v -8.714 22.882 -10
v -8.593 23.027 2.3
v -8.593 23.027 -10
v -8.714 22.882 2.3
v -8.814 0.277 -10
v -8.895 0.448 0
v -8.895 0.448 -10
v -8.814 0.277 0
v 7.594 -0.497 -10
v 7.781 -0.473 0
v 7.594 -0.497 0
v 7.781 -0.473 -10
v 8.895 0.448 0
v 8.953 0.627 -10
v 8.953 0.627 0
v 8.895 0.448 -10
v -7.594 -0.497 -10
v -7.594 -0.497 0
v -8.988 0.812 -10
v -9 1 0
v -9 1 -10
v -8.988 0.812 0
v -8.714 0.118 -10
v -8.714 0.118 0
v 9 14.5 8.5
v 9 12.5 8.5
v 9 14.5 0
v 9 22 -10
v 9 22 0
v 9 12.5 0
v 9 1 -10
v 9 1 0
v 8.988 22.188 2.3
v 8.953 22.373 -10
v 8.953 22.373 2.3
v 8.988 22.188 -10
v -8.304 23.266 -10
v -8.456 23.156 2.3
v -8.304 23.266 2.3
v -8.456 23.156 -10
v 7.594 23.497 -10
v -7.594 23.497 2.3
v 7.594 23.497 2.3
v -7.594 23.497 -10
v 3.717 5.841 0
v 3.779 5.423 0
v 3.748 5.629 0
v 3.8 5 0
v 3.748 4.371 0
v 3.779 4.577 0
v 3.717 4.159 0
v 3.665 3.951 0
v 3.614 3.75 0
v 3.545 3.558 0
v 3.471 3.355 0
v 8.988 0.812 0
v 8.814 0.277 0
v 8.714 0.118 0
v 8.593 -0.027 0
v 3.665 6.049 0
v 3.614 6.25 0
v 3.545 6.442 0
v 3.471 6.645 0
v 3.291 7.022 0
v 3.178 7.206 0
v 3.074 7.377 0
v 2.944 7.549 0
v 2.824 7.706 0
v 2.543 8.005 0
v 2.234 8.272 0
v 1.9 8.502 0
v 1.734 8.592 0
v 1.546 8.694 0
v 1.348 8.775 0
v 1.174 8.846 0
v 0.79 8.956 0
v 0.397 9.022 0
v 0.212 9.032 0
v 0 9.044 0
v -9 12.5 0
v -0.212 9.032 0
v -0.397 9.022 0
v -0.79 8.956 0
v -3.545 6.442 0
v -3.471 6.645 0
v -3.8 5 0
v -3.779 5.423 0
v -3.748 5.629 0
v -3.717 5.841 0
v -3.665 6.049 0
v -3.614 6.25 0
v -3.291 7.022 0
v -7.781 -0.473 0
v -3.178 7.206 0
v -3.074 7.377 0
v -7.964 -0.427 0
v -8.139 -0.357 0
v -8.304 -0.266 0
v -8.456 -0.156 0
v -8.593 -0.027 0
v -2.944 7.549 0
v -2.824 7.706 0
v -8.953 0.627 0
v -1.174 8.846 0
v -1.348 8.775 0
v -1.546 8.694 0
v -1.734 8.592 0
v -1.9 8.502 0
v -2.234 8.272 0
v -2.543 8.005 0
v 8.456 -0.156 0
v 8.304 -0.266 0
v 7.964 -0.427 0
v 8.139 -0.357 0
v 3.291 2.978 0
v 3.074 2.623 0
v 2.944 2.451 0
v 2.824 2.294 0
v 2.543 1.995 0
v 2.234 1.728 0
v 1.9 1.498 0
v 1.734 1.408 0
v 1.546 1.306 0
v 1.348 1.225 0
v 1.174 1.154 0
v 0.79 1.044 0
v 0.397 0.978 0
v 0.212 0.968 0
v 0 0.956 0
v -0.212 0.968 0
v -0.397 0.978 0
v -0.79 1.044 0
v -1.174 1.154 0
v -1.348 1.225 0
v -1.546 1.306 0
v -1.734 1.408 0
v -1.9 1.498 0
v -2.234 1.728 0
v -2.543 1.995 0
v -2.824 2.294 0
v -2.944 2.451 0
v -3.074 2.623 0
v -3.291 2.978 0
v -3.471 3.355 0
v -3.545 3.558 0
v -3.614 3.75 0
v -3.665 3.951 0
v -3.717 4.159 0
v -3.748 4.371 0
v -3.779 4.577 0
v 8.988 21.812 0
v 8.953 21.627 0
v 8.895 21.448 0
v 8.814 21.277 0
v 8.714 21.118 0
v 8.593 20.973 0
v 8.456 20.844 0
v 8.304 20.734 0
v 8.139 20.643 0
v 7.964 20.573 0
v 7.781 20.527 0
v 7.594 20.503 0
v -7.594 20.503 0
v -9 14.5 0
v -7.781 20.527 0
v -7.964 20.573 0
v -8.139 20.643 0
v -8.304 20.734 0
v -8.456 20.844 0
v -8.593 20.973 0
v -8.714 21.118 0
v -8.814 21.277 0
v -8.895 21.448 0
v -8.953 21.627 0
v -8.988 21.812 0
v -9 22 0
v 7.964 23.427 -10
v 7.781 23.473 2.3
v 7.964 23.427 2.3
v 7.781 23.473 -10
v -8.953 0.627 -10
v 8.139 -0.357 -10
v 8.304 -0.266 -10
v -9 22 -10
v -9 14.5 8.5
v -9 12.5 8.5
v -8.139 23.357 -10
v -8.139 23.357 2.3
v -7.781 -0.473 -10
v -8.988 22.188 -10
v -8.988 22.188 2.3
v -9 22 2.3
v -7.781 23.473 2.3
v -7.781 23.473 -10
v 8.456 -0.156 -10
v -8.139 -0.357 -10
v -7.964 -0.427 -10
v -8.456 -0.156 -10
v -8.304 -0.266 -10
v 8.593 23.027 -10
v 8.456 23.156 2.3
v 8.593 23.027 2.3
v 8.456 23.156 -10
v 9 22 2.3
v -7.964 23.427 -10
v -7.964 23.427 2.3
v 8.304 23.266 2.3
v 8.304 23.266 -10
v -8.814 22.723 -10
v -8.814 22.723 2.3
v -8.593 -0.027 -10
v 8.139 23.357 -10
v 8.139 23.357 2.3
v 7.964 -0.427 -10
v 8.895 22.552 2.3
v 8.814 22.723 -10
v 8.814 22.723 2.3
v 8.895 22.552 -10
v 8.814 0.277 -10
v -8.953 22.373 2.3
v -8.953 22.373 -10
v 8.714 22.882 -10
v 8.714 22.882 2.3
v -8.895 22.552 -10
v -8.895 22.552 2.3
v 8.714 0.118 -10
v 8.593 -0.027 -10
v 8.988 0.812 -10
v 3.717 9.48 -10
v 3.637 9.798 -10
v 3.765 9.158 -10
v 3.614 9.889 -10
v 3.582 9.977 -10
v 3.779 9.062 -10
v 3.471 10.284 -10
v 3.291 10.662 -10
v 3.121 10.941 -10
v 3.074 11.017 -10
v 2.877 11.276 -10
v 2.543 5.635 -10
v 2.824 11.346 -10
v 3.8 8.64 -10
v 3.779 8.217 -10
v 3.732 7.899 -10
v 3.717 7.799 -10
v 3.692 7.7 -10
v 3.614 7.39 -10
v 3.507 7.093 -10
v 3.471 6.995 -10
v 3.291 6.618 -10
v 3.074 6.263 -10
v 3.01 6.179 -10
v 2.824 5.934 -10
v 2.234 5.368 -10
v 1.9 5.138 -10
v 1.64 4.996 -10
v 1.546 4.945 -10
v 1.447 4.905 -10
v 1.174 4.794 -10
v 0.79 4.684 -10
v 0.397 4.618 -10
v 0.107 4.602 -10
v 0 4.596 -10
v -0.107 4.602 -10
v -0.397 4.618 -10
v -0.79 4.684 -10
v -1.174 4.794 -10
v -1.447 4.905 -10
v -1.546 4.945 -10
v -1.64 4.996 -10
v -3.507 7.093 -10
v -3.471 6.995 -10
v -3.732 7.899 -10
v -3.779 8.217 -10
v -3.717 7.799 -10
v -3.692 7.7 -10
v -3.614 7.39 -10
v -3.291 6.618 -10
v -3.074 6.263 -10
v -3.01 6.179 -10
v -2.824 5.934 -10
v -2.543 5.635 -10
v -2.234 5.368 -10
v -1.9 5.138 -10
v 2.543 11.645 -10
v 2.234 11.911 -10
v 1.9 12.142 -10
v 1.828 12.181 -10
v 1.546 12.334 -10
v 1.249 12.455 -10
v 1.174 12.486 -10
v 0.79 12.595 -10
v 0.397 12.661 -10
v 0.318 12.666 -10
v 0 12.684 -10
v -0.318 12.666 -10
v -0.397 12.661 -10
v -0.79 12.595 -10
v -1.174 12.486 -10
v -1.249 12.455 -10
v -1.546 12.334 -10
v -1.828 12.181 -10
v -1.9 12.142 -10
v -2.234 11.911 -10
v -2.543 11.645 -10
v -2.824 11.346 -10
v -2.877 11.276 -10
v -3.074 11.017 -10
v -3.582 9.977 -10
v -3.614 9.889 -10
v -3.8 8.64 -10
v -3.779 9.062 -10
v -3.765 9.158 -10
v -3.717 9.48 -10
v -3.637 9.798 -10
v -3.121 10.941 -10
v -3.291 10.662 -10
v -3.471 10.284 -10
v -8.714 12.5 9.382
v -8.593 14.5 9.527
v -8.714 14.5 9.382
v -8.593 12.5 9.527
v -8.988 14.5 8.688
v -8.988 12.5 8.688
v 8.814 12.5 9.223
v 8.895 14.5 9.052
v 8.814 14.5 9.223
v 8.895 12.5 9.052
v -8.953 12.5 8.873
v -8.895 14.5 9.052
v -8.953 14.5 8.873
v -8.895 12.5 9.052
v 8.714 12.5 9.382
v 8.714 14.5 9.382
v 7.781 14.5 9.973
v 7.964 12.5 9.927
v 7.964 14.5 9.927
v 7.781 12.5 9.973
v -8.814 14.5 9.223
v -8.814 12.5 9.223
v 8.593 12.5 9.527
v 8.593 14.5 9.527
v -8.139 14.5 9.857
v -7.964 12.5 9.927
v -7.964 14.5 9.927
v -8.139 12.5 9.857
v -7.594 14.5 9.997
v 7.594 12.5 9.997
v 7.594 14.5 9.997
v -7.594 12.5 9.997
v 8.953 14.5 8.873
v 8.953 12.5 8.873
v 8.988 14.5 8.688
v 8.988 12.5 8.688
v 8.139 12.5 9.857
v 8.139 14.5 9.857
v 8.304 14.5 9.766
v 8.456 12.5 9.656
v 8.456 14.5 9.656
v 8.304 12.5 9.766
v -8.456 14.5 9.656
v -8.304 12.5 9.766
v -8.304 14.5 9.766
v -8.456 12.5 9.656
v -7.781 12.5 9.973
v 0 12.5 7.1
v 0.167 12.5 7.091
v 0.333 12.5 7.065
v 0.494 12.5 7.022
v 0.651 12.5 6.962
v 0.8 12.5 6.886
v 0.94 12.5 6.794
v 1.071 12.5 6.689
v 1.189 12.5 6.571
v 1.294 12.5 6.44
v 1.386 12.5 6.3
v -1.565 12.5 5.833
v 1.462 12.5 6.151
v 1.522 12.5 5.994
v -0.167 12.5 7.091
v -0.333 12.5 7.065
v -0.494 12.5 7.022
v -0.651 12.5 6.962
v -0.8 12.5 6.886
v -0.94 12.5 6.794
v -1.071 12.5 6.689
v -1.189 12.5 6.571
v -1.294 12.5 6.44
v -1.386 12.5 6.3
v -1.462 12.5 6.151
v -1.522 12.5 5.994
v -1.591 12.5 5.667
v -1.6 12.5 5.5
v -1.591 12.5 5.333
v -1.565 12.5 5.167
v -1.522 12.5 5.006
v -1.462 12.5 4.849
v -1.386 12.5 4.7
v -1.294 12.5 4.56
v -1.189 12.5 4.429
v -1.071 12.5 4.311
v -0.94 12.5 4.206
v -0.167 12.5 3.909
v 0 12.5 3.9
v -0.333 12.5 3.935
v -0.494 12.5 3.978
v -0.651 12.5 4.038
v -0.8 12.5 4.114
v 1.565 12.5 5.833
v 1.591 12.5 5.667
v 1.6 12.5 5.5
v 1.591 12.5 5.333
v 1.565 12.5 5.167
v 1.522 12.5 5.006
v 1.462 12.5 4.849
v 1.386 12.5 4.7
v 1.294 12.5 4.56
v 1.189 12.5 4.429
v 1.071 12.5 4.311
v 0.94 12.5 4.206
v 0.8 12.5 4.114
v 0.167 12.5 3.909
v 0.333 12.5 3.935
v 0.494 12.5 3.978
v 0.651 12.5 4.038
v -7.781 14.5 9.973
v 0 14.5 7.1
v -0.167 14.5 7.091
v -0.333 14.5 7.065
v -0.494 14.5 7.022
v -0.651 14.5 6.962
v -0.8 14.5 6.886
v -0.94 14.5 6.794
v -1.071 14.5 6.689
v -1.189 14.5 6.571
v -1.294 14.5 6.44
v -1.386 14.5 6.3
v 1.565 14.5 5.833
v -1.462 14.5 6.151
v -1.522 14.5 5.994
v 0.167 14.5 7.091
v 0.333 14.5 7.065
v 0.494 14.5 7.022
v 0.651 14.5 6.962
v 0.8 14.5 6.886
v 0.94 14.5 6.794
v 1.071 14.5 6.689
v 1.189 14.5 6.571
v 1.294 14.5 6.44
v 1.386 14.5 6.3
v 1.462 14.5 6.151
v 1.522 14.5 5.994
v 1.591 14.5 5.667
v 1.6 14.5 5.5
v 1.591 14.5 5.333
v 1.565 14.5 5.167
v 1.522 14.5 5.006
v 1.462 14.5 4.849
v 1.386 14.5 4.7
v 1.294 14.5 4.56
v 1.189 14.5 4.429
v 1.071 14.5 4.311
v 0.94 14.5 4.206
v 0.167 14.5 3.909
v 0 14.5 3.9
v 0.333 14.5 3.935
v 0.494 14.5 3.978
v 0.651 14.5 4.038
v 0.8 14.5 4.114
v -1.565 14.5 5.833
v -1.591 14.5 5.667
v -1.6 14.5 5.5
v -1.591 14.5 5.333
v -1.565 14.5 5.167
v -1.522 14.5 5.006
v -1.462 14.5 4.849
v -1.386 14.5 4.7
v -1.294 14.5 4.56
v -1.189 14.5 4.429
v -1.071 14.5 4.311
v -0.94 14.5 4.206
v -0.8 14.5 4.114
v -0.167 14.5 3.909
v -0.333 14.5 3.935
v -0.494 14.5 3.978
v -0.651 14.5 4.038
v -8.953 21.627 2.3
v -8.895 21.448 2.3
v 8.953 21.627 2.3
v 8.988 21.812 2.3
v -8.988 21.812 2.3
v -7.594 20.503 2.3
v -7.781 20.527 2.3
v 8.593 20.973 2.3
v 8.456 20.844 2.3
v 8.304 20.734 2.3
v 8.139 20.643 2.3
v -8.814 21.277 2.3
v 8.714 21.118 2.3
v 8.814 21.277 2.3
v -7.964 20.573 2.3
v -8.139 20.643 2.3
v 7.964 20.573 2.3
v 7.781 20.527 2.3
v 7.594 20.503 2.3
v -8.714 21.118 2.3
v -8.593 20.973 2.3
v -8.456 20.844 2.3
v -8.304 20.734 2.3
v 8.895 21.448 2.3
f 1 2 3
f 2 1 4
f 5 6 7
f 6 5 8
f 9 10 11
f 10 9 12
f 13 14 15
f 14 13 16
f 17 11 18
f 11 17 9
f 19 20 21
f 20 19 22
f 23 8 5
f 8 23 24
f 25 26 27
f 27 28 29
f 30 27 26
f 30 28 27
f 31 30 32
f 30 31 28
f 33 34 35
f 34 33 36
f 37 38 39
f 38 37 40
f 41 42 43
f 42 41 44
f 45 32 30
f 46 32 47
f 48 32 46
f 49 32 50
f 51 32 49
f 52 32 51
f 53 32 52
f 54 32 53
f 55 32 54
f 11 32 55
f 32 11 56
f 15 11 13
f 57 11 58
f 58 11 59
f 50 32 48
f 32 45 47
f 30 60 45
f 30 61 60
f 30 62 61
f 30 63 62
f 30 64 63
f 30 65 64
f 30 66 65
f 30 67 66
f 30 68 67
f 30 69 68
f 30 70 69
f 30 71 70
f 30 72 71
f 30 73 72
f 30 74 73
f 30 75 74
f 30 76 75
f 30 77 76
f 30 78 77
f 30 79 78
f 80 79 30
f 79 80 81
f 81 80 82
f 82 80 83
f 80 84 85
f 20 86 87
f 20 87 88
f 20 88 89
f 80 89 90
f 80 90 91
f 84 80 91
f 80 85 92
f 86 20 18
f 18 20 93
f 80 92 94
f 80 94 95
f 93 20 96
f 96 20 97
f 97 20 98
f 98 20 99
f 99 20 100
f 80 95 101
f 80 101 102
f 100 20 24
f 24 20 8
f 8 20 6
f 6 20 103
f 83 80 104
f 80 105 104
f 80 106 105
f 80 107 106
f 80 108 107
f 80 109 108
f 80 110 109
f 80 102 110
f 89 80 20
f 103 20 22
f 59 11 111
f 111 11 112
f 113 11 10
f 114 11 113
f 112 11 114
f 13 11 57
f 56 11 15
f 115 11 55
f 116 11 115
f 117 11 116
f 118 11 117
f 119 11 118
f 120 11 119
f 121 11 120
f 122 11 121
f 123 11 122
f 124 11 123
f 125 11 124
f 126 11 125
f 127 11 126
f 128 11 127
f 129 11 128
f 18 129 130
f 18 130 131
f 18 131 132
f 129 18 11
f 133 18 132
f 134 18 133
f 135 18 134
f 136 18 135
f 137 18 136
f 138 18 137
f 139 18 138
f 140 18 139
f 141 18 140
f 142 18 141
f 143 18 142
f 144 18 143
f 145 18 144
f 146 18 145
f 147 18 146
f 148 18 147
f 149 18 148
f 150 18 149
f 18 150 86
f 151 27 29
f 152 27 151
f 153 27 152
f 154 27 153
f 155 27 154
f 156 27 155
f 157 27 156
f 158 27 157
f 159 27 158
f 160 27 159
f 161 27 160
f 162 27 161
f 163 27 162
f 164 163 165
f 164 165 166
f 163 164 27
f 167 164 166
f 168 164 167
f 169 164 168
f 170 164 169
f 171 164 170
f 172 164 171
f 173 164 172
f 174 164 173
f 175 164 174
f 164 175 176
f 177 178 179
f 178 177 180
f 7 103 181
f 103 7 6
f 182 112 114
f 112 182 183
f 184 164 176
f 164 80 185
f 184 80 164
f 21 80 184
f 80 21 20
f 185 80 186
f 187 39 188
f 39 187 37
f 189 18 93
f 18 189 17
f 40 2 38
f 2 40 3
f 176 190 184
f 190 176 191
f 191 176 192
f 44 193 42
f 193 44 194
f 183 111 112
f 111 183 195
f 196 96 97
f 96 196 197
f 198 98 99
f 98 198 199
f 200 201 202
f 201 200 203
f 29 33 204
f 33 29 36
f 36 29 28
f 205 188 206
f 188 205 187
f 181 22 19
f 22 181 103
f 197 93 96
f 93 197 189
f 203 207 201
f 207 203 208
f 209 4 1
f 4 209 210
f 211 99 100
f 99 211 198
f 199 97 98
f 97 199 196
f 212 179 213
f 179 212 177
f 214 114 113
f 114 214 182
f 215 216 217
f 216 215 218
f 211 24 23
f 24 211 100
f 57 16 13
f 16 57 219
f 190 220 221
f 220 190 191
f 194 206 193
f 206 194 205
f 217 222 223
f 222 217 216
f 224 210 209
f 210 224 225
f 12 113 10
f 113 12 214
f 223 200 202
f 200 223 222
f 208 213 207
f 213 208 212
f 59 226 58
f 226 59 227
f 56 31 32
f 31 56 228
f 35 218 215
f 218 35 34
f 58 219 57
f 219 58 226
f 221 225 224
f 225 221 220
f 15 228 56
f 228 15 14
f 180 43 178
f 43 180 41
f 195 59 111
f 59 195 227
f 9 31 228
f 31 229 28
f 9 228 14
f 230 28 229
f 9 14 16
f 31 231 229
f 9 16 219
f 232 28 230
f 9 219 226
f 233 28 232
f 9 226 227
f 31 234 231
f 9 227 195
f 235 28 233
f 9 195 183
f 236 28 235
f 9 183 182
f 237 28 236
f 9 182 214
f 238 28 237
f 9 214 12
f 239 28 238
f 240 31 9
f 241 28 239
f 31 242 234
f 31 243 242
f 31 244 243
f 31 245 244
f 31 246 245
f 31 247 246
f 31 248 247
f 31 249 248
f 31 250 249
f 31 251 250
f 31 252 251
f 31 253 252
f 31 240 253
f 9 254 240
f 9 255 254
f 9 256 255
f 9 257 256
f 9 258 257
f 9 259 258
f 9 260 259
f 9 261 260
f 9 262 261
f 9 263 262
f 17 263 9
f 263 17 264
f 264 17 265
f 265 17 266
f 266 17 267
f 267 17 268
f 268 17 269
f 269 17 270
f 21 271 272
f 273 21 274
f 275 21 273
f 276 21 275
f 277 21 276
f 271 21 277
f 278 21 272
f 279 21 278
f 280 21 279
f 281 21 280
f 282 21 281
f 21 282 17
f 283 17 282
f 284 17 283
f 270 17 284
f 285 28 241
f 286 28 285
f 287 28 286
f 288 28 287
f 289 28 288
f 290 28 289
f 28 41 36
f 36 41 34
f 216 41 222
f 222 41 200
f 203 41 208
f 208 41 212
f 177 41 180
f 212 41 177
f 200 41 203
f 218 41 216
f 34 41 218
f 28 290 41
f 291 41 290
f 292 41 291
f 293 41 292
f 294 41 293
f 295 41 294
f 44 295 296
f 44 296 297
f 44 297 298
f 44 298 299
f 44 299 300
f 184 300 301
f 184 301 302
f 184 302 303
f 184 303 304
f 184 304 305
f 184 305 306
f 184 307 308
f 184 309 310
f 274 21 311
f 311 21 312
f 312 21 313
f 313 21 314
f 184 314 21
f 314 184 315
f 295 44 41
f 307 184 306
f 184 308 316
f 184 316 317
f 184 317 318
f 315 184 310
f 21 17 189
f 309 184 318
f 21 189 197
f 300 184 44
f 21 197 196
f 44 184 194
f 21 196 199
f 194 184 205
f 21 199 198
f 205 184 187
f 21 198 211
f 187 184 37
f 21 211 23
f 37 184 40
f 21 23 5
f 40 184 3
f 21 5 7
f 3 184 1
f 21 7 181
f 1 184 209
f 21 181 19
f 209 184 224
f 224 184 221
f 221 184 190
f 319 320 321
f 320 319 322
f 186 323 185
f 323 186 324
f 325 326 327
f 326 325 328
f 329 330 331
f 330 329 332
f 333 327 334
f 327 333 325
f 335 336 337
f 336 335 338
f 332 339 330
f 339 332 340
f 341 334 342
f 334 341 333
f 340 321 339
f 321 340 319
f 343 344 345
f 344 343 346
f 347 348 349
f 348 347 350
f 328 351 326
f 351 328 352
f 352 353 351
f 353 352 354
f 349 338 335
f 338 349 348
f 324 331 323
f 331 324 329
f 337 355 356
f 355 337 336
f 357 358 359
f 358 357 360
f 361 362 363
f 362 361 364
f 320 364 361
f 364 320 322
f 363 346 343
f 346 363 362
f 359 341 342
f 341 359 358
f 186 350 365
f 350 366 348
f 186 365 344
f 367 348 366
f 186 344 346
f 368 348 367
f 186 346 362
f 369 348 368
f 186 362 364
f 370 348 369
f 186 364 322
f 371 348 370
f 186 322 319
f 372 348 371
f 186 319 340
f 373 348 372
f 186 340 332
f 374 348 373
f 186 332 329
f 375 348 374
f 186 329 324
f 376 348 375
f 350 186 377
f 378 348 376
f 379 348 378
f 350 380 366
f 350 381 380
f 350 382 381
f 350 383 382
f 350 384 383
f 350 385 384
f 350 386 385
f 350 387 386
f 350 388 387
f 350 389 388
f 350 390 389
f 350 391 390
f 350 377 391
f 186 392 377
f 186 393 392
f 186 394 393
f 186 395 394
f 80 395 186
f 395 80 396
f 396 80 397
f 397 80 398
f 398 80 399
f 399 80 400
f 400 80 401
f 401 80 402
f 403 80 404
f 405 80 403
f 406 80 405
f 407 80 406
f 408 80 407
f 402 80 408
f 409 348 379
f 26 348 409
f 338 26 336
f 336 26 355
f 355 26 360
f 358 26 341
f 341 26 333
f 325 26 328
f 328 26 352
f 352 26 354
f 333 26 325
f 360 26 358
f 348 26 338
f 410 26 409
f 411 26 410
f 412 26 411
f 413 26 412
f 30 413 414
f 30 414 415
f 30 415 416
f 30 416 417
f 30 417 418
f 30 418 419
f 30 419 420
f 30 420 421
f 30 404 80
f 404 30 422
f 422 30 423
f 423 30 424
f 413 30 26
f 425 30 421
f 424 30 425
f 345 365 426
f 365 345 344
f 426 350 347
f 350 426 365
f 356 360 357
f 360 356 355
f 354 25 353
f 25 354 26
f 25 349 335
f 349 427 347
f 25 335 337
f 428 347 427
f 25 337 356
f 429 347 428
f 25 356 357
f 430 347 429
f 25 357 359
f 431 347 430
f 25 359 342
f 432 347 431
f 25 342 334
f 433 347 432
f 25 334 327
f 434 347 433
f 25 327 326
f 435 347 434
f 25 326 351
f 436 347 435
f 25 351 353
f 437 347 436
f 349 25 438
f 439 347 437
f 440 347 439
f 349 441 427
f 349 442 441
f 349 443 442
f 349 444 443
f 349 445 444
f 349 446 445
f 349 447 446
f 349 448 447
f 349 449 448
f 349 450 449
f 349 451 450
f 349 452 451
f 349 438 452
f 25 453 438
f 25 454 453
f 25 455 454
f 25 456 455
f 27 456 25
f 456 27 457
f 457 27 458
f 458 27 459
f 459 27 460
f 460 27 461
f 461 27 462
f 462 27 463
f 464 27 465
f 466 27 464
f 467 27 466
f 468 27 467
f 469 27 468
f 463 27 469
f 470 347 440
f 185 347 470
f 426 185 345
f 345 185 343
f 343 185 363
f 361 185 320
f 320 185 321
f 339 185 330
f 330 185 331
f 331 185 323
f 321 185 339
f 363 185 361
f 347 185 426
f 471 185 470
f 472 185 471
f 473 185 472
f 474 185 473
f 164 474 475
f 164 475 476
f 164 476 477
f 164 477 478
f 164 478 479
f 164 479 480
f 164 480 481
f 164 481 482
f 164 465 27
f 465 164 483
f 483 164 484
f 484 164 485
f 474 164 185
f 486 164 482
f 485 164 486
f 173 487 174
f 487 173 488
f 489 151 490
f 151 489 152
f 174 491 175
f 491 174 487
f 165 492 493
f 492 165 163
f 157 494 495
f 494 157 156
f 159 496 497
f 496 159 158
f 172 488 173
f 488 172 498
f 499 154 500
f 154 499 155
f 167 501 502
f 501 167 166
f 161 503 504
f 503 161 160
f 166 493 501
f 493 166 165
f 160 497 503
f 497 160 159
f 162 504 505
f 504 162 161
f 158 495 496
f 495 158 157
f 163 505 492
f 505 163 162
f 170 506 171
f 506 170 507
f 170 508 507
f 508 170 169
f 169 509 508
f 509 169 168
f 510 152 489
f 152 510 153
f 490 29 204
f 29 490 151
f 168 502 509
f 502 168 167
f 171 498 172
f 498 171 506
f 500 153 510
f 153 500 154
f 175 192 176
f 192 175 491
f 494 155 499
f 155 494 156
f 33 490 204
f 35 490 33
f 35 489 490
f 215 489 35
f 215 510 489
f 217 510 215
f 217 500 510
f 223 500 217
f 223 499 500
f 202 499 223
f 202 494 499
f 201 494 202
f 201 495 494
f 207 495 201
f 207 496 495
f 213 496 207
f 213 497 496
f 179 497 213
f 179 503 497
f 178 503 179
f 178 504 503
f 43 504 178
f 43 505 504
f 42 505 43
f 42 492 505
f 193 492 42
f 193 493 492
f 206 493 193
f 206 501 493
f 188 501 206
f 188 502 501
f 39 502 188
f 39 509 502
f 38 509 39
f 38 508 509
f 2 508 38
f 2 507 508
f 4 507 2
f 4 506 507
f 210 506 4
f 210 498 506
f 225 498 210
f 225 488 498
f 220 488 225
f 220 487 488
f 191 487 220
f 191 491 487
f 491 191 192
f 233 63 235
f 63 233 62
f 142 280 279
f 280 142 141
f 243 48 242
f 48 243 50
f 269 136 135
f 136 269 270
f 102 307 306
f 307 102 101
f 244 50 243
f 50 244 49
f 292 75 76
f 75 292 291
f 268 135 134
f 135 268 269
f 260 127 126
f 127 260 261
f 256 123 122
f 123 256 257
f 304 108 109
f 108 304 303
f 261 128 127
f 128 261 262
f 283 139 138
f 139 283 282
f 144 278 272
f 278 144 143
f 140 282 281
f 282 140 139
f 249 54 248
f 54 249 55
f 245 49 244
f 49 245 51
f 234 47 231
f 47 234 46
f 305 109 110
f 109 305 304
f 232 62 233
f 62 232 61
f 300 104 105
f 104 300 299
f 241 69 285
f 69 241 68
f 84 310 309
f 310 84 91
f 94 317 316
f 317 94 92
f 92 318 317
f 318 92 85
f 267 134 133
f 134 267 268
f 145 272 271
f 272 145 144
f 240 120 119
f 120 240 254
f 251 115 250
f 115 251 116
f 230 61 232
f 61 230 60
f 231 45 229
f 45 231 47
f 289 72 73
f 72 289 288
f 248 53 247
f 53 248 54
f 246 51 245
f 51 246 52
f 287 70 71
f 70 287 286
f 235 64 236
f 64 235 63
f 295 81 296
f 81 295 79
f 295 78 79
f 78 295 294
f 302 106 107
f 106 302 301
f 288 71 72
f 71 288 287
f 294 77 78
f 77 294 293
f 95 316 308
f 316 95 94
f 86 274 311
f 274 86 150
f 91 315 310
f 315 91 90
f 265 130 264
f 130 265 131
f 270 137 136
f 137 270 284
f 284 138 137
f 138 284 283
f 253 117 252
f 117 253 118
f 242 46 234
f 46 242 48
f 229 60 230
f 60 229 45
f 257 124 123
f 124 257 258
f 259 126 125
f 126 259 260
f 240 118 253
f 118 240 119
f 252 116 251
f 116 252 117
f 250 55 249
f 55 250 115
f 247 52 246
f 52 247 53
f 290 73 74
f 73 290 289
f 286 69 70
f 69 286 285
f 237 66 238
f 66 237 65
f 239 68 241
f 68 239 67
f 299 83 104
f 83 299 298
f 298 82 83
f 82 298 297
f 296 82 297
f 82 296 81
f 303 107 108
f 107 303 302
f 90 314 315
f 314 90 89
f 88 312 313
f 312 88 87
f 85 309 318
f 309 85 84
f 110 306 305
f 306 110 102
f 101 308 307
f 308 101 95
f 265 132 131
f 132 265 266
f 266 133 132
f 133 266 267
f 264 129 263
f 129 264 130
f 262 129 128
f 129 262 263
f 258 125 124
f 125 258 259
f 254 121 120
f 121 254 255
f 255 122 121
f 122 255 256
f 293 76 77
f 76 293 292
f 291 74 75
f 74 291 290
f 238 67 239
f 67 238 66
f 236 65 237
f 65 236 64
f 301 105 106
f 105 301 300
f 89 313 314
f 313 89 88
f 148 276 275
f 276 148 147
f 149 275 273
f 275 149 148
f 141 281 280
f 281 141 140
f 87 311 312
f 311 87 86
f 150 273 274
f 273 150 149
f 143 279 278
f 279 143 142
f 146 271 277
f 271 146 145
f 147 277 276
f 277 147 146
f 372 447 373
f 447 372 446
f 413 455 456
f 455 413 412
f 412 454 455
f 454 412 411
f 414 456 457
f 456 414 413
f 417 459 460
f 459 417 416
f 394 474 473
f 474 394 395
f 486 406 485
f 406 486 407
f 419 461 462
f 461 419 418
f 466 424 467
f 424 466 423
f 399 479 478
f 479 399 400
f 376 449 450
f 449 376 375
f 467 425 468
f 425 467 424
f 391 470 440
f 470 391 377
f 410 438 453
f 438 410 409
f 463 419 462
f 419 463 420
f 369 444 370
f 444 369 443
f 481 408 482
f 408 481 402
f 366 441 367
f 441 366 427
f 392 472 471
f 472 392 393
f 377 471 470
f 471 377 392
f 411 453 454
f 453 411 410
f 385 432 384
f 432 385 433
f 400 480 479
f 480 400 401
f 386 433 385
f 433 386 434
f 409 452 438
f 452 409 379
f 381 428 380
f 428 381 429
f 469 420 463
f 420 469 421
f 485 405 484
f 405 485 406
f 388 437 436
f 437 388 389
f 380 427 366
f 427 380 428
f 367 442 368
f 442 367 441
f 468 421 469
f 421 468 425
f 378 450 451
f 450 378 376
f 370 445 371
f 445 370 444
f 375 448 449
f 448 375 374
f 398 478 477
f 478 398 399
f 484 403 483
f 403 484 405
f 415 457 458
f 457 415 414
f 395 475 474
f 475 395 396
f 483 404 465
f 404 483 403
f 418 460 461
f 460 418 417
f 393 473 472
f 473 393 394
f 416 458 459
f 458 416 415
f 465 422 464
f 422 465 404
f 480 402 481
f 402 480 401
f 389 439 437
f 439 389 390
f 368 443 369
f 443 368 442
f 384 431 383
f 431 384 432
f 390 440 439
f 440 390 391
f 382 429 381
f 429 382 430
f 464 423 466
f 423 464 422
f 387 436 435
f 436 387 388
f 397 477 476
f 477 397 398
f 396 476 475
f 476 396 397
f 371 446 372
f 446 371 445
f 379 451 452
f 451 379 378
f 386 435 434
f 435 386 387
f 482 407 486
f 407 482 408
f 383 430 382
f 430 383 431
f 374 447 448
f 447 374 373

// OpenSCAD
// file: Lib/prism.scad
   module prism(l, w, h){
   polyhedron(
           points=[[0,0,0], [l,0,0], [l,w,0], [0,w,0], [0,w,h], [l,w,h]],
           faces=[[0,1,2,3],[5,4,3,2],[0,4,5,1],[0,3,4],[5,2,1]]
           );

   }
   
// file: Lib/corner_radiuser.scad
module cornerRadiuser(radius=6){
    difference(){
        translate([radius/2,radius/2,0])
        cube([radius,radius,radius*2], center=true);
        cylinder(h=(radius*2)+2,r=radius, center=true);
    }
}
// file: Lib/steppers.scad
/**
 * Implementation of a model of a 28BYJ-48 type cheapo stepper motor
 */
module stepper28BYJ48(){
    color("light grey"){
        translate([0,-8,0]){
            // Motor body
            translate([0,0,(19/2)*-1]){
                cylinder(d=28,h=19, center=true);
            }

            // Motor snooter
            translate([0,8,0]){
                translate([0,0,(1.5/2)])cylinder(d=9,h=1.5, center=true);
                difference(){
                    translate([0,0,(5/2)+2])cylinder(d=5,h=6, center=true);
                    mirrorCopy([0,1,0]){
                        translate([0,4,(5/2)+2.1])cube([5,5,6.2], center=true);
                    }
                }
            }
            
            // cable gland
            translate([0,(17/2)*-1,(19/2)*-1]){
                cube([14.8,17,19], center=true);
            }
            
            // Attachment crossbar
            difference(){
                hull(){
                    mirrorCopy([1,-0,0]){
                        translate([(35/2),0,(1/2)*-1]){
                            cylinder(h=1,d=7, center=true);
                        }
                    }
                }
                mirrorCopy([1,-0,0]){
                    translate([(35/2),0,(1/2)*-1]){
                        cylinder(h=1+0.01,d=4.2, center=true);
                    }
                }
            }
        }
    }
}


module stepper28BYJ48_cutouts(){
    color("orange"){
        translate([0,-8,0]){
            mirrorCopy([1,-0,0]){
                translate([(35/2),0,(1/2)*-1]){
                    cylinder(h=1+0.01,d=4.2, center=true);
                }
            }
        }
    }
}
// file: Lib/metric_bolts.scad
capSizeMSizeMultiplier = 1.66*1.01;
printingKerfMM = 0.6;
circleFacets = 60;
boltColour = "LightSkyBlue";
boltClearanceColour = "LightSteelBlue";

module metricBoltHex(mSize, structural=false, recessNut=0, chamfer=false){
    // Hex diameter = mSize * 1.8, (or 2.0 if structural
    // We add 1% to make the hex slip in better
    hexDiameter = (mSize * (structural?2.0:1.8) * 1.01) + printingKerfMM;

    color(boltColour)
    translate([0,0,(mSize*0.7)/2])
    cylinder(d=hexDiameter,h=mSize * 0.7, $fn=6, center=true);
    
    if(recessNut > 0){
        color(boltClearanceColour)
        translate([0,0,(recessNut/2)*-1])
        cylinder(d=hexDiameter,h=recessNut, $fn=6, center=true);
    }
    if(chamfer){
        chamferHeight = mSize*1.5*0.595;
        color(boltClearanceColour)
        translate([0,0,(mSize * 0.7)+(chamferHeight/2)])
        cylinder(d1=hexDiameter,d2=0,h=chamferHeight, center=true, $fn=6);
    }
}

module metricSocketCap(mSize, length, structural=false,recessCap=0, chamfer=false, overrideCapSize=0){
    //cap size = M number * 1.5.
    // We add 1% to make the cap head spin nicely in the hole.
    capSize = overrideCapSize > 0 ? overrideCapSize : (mSize * capSizeMSizeMultiplier) + printingKerfMM;
    
    color(boltColour)
        translate([0,0,(length + ((mSize*1.25)/2))])
            cylinder(d=capSize,h=mSize*1.25, center=true, $fn=circleFacets);
    //echo (str("cap size is ", capSize));
    if(recessCap > 0){
        color(boltClearanceColour)
        translate([0,0,(length + ((recessCap/2)+(mSize*1.25)))])
        cylinder(d=capSize,h=recessCap, center=true, $fn=circleFacets);
    }
    if(chamfer){
        color(boltClearanceColour)
        translate([0,0,(length-((mSize*1.5*0.595)/2))])
        cylinder(d2=capSize,d1=0,h=mSize*1.5*0.595, center=true, $fn=circleFacets);
    }
}

module metricShaft(mSize, length, structural=false){
    color(boltColour)
        translate([0,0,(length/2)])
            cylinder(d=mSize+printingKerfMM, h=length+0.01, center=true, $fn=circleFacets);
}

module metricSocketScrew(mSize, length, structural=false, recessCap=0, chamfer=false, overrideCapSize=0){
    metricSocketCap(mSize, length, structural=structural, recessCap=recessCap, chamfer=chamfer, overrideCapSize=overrideCapSize);
    metricShaft(mSize, length, structural=structural);
}

module metricCapheadAndBolt(mSize, length=40, structural=false, recessCap=0, recessNut=0, chamfer=false, overrideCapSize=0){
    capSize = overrideCapSize > 0 ? overrideCapSize : (mSize * capSizeMSizeMultiplier) + printingKerfMM;

    /*echo (str("Creating a M",mSize, " size, ", length, "mm long bolt with a ", capSize, "mm wide caphead and bolt ", chamfer?"with":"without", " chamfering."));
    if(recessCap){
        echo (str("It has a ", recessCap, "mm recessed cap"));
    }
    if(recessNut){
        echo (str("It has a ", recessCap, "mm recessed nut"));
    }/**/
    translate([0,0,((length/2)+((mSize*1.25)/2))*-1])
    union(){
        translate([0, 0, 0])
        metricSocketScrew(mSize, length, structural=structural, recessCap=recessCap, chamfer=chamfer, overrideCapSize=overrideCapSize);
        metricBoltHex(mSize,structural, recessNut=recessNut, chamfer=chamfer);
    }
}

/**/
translate([0,10,0])
metricCapheadAndBolt(6, 40);

translate([20,10,0])
metricCapheadAndBolt(6, 40, recessNut=1, recessCap=1, chamfer=true);
/**/
/*
translate([0,10,0])
metricCapheadAndBolt(6, 20, recessNut=10, recessCap=10);
/*
translate([0,20,0])
metricCapheadAndBolt(6, 20, chamfer=true);

translate([20,0,0])
metricCapheadAndBolt(10, 40);

translate([20,20,0])
metricCapheadAndBolt(10, 40, recessNut=10, recessCap=10);

translate([20,40,0])
metricCapheadAndBolt(10, 40, chamfer=true);
*/
// file: Lib/pcd.scad
module pcd(degrees){
    count=360/degrees;
    for(i=[1 : count]){
        rotate(degrees*i)
        children();
    }
}

module pcdAtFixedDegrees(degrees){
    for(degree=degrees){
        rotate(degree)
        children();
    }
}
// file: Lib/extrusion.scad
use <mirrorcopy.scad>
module doubleExtrusion(width,length, center=false){
    extraWallWidth = width*0.09;
    mirrorCopy([0,1,0]){
        color("orange")
        translate([0,(width - extraWallWidth)/2,length/2])
        cube([center?0:width/2,extraWallWidth,length], center=true);
    }
    translate([(width/2),0,0])
    children();
    translate([(width/2)*-1,0,0])
    children();
}

module extrusion(length=10, outer=40, tSlot=8, gusset=4.5, bore=7, center=false){
    translate([0,0,center?0:length/2]){
        difference(){
            color("orange")
            union(){
                // Corners
                mirrorCopy([1,0,0]){
                    mirrorCopy([0,1,0]){
                        difference(){
                            union(){
                                translate([((outer-(outer-tSlot)/2)/2),(outer-(gusset))/2,0])
                                cube([(outer-tSlot)/2, (gusset),length], center=true);
                                mirror([-1,1,0])
                                translate([((outer-(outer-tSlot)/2)/2),(outer-(gusset))/2,0])
                                cube([(outer-tSlot)/2, (gusset),length], center=true);
                            }
                            difference(){
                                translate([((outer-(gusset))/2)+1,((outer-(gusset))/2)+1,0])
                                    cube([gusset*2,gusset*2,length+2], center=true);
                                translate([(outer-(gusset*2))/2,(outer-(gusset*2))/2,0])
                                    cylinder(d=gusset*2,h=length+4, center=true);
                            }
                        }
                    }
                }
                
                // Crossbar
                mirrorCopy(){
                    rotate(45)
                    cube([outer*1.3, gusset, length], center=true);
                }
                
                // Core
                cube([bore*2,bore*2,length], center=true);
            };
            
            union(){
                // Tappable Bore
                cylinder(d=bore, h=length+2, center=true);
            }
        }
    }
}

module extrusion80x40(length, center=false){
    doubleExtrusion(40,length, center=center)
    extrusion40x40(length, center=center);
}
module extrusion60x30(length, center=false){
    doubleExtrusion(30,length, center=center)
    extrusion30x30(length, center=center);
}
module extrusion40x20(length, center=false){
    doubleExtrusion(20,length, center=center)
    extrusion20x20(length, center=center);
}

module extrusion20x20(length, center=false)
{
    extrusion(length=length, outer=20,tSlot=5, gusset=1.8, bore=4, center=center);
}

module extrusion30x30(length, center=false)
{
    extrusion(length=length, outer=30,tSlot=8, gusset=2.5, bore=7, center=center);
}

module extrusion40x40(length, center=false)
{
    extrusion(length=length, outer=40,tSlot=8, gusset=4.5, bore=7, center=center);
}
/**/
translate([-40,0,0])extrusion20x20(10, center=true);
translate([-60,30,0])extrusion30x30(10, center=true);
translate([-80,30+40,0])extrusion40x40(10, center=true);

translate([0,0,0])extrusion20x20(10);
translate([0,30,0])extrusion30x30(10);
translate([0,30+40,0])extrusion40x40(10);

translate([40,0,0])extrusion40x20(10);
translate([60,30,0])extrusion60x30(10);
translate([80,30+40,0])extrusion80x40(10);
/**/
// file: Lib/part_splitter.scad
module partSplitter(height=0,maxSize=200, spread=10, top=true, bottom=true){
    if($preview){
        children();
        translate([0,0,height])
            #cube([maxSize,maxSize,0.01], center=true);
    }else{
        if(top){
            color("red")
                translate([0,0,(spread/2)])
                    difference(){
                        children();
                        translate([0,0,((maxSize/2)*-1)+height])
                            cube([maxSize,maxSize,maxSize], center=true);
                    }
        }
        if(bottom){
            color("green")
                translate([0,0,(spread/2)*-1])
                    difference(){
                        children();
                        translate([0,0,(maxSize/2)+height])
                            cube([maxSize,maxSize,maxSize], center=true);
                    }
        }
    }
} 
// file: Lib/mirrorcopy.scad
module mirrorCopy(vec=[1,0,0]){
    children();
    mirror(vec) children();
} 
// file: Lib/bearings.scad
$useMcMaster = true;
module bearing(id, od, wd, mcmaster, series, labels=false){
    echo(str("Creating a ", series, " bearing with id=", id, "mm od=", od, "mm width=", wd, "mm ..."));
    difference(){
        color("grey")cylinder(d=od,h=wd, center=true);
        color("white")cylinder(d=id,h=wd+1, center=true);  
        if($preview && labels){
            bearing_lettering(id, od, wd, mcmaster, series);    
        }
    }
}

module bearing_lettering(id, od, wd, mcmaster, series)
{
    degreesSeries = 25*len(series);
    degreesMcMaster = 25*len(mcmaster);
    color("black")
    rotate(180+45){
        rotate(degreesSeries)
        bearing_text(id,od, wd, series,degreesSeries);
        if($useMcMaster){
            rotate(degreesMcMaster+degreesSeries+10)
            bearing_text(id,od, wd, mcmaster, degreesMcMaster);   
        }
    }
}

module bearing_text(id, od, wd, st, radiusConsumed=180){
    bearingGirth = (od-id)/2;
    letterHeight = bearingGirth * 0.6;
    letterOffsetFromCenter = (od/2) - (bearingGirth*0.9);
    
    width=bearingGirth ;
    thickness=wd/20 ;
    chars=len(st)+1 ;
    //echo(str("Writing ", st, " at " , letterOffsetFromCenter, "mm from center"));
    for (i = [1:chars]) {
            rotate([0,0,90-(i*(radiusConsumed/chars))])
            translate([0,letterOffsetFromCenter,(bearingGirth/2)-((thickness+1)/2)])
            linear_extrude(thickness+1)
            text(st[i-1],size=letterHeight, halign="center");
    }
}


module bearing_608(labels=true){ bearing(8,22,7,"5972K91","608", labels=labels); }
module bearing_629(labels=true){ bearing(9,26,8,"5972K93","629", labels=labels); }
module bearing_635(labels=true){ bearing(5,19,6,"5972K197","635", labels=labels); }
module bearing_6000(labels=true){ bearing(10,26,8,"5972K94","6000", labels=labels); }
module bearing_6001(labels=true){ bearing(12,28,8,"5972K95","6001", labels=labels); }
module bearing_6002(labels=true){ bearing(15,32,9,"5972K358","6002", labels=labels); }
module bearing_6003(labels=true){ bearing(17,35,10,"5972K311","6003", labels=labels); }
module bearing_6007(labels=true){ bearing(35,62,14,"5972K312","6007", labels=labels); }
module bearing_6200(labels=true){ bearing(10,30,9,"5972K101","6200", labels=labels); }
module bearing_6201(labels=true){ bearing(12,32,10,"5972K313","6201", labels=labels); }
module bearing_6202(labels=true){ bearing(15,35,11,"5972K314","6202", labels=labels); }
module bearing_6203(labels=true){ bearing(17,40,12,"5972K104","6203", labels=labels); }
module bearing_6204(labels=true){ bearing(20,47,14,"5972K105","6204", labels=labels); }
module bearing_6205(labels=true){ bearing(25,52,15,"5972K315","6205", labels=labels); }
module bearing_6206(labels=true){ bearing(30,62,16,"5972K316","6206", labels=labels); }
module bearing_6207(labels=true){ bearing(35,72,17,"5972K317","6207", labels=labels); }
module bearing_6208(labels=true){ bearing(40,80,18,"5972K114","6208", labels=labels); }
module bearing_6209(labels=true){ bearing(45,85,19,"5972K115","6209", labels=labels); }
module bearing_6210(labels=true){ bearing(50,90,20,"5972K129","6210", labels=labels); }
module bearing_6211(labels=true){ bearing(55,100,21,"5972K113","6211", labels=labels); }
module bearing_6212(labels=true){ bearing(60,110,22,"5972K3","6212", labels=labels); }
module bearing_6301(labels=true){ bearing(12,37,12,"5972K318","6301", labels=labels); }
module bearing_6302(labels=true){ bearing(15,42,13,"5972K117","6302", labels=labels); }
module bearing_6303(labels=true){ bearing(17,47,14,"5972K118","6303", labels=labels); }
module bearing_6304(labels=true){ bearing(20,52,15,"5972K119","6304", labels=labels); }
module bearing_6305(labels=true){ bearing(25,62,17,"5972K121","6305", labels=labels); }
module bearing_6306(labels=true){ bearing(30,72,19,"5972K319","6306", labels=labels); }
module bearing_6307(labels=true){ bearing(35,80,21,"5972K503","6307", labels=labels); }
module bearing_6308(labels=true){ bearing(40,90,23,"5972K124","6308", labels=labels); }
module bearing_6309(labels=true){ bearing(45,100,25,"5972K125","6309", labels=labels); }
module bearing_6310(labels=true){ bearing(50,110,27,"5972K126","6310", labels=labels); }
module bearing_6311(labels=true){ bearing(55,120,29,"5972K127","6311", labels=labels); }
module bearing_6312(labels=true){ bearing(60,130,31,"5972K128","6312", labels=labels); }
module bearing_6403(labels=true){ bearing(17,62,17,"5972K198","6403", labels=labels); }
module bearing_6800(labels=true){ bearing(10,19,5,"5972K211","6800", labels=labels); }
module bearing_6801(labels=true){ bearing(12,21,5,"5972K212","6801", labels=labels); }
module bearing_6802(labels=true){ bearing(15,24,5,"5972K213","6802", labels=labels); }
module bearing_6803(labels=true){ bearing(17,26,5,"5972K214","6803", labels=labels); }
module bearing_6804(labels=true){ bearing(20,32,7,"5972K215","6804", labels=labels); }
module bearing_6805(labels=true){ bearing(25,37,7,"5972K216","6805", labels=labels); }
module bearing_6806(labels=true){ bearing(30,42,7,"5972K217","6806", labels=labels); }
module bearing_6900(labels=true){ bearing(10,22,6,"5972K241","6900", labels=labels); }
module bearing_6901(labels=true){ bearing(12,24,6,"5972K242","6901", labels=labels); }
module bearing_6902(labels=true){ bearing(15,28,7,"5972K243","6902", labels=labels); }
module bearing_6903(labels=true){ bearing(17,30,7,"5972K244","6903", labels=labels); }
module bearing_6904(labels=true){ bearing(20,37,9,"5972K245","6904", labels=labels); }
module bearing_6905(labels=true){ bearing(25,42,9,"5972K246","6905", labels=labels); }
module bearing_6906(labels=true){ bearing(30,47,9,"5972K247","6906", labels=labels); }
module bearing_6907(labels=true){ bearing(35,55,10,"5972K248","6907", labels=labels); }
module bearing_6908(labels=true){ bearing(40,62,12,"5972K249","6908", labels=labels); }
module bearing_16002(labels=true){ bearing(15,32,8,"5972K199","16002", labels=labels); }
module bearing_16004(labels=true){ bearing(20,42,8,"5972K218","16004", labels=labels); }
module bearing_16005(labels=true){ bearing(25,47,8,"5972K219","16005", labels=labels); }
module bearing_16100(labels=true){ bearing(10,28,8,"5972K223","16100", labels=labels); }
module bearing_16101(labels=true){ bearing(12,30,8,"5972K224","16101", labels=labels); }

translate([0,0,0])
{   
    bearing_6800();
    bearing_6804();
    bearing_6907();
    translate([50,0,0])
    bearing_16101();
}


translate([0,60,0])
{   
    bearing_6800(labels=false);
    bearing_6804(labels=false);
    bearing_6907(labels=false);
    translate([50,0,0])
    bearing_16101(labels=false);
}
// file: Lib/mattlib.scad
include <../Lib/bearings.scad>;
include <../Lib/mirrorcopy.scad>;
include <../Lib/part_splitter.scad>;
include <../Lib/extrusion.scad>;
include <../Lib/pcd.scad>;
include <../Lib/metric_bolts.scad>;
include <../Lib/steppers.scad>;
include <../Lib/corner_radiuser.scad>;
include <../Lib/gears.scad>;
include <../Lib/prism.scad>;
// main file
use <Lib/mattlib.scad>
$fn=60;
bore=7.2+0.4; // 7.2mm + bullshit factor
angleTiltDown=20;
bodyRadiusMM = 3;

/*
translate([(18/2)*-1,0,0])
color("green")difference(){
    union(){
        cube([18,10,23.50]);
        translate([0,-10,12.5])
        cube([18,10,2]);
        translate([0,-2.3,20.5])
        cube([18,2.3,3]);
    }
    
    translate([18/2,0,5])
    rotate([-90+angleTiltDown,0,0])
    #cylinder(40,d=bore,center=true);
    translate([18/2,-5.5,zOffset])
    #cylinder(4,d=3.2);   
}/**/


module qqs_borescope_cam_mount(){
    difference(){
        union(){
            // Main body
            hull(){
                mirrorCopy([1,0,0]){
                    translate([(18/2)-(bodyRadiusMM/2),5,-0.5+(bodyRadiusMM/2)]){
                        rotate([90,0,0]){
                            cylinder(h=10,d=bodyRadiusMM, center=true);
                        }
                    }
                    translate([(18/2)-(bodyRadiusMM/2),5,23.5-(bodyRadiusMM/2)]){
                        rotate([90,0,0]){
                            cylinder(h=10,d=bodyRadiusMM, center=true);
                        }
                    }
                }
            }

            // Lower deck
            deckThicknessMM = 2;
            hull(){
                mirrorCopy([1,0,0]){
                    translate([(18/2)-(bodyRadiusMM/2),-10+(bodyRadiusMM/2),13.5]){
                        cylinder(h=deckThicknessMM, d=bodyRadiusMM, center=true);
                    }
                }
                translate([0,0,13.5])
                    cube([18,1,2], center=true);
            }

            // Upper Deck
            hull(){
                mirrorCopy([1,0,0]){
                    translate([(18/2)-(bodyRadiusMM/2),-(2.3/2),23.5-(bodyRadiusMM/2)]){
                        rotate([90,0,0]){
                            cylinder(h=2.3,d=bodyRadiusMM, center=true);
                        }
                    }
                    
                }
                
            }
        }
        union(){
            translate([0,0,5]){
                rotate([-90+angleTiltDown,0,0]){
                    cylinder(40,d=bore,center=true, center=true);
                }
            }
            translate([0,-5.5,13.5]){
                cylinder(4,d=3.2, center=true);   
            }
        }
    }
}

if($preview){
    qqs_borescope_cam_mount();
}else{
    rotate([-90,0,0]){
        qqs_borescope_cam_mount();
    }
}
